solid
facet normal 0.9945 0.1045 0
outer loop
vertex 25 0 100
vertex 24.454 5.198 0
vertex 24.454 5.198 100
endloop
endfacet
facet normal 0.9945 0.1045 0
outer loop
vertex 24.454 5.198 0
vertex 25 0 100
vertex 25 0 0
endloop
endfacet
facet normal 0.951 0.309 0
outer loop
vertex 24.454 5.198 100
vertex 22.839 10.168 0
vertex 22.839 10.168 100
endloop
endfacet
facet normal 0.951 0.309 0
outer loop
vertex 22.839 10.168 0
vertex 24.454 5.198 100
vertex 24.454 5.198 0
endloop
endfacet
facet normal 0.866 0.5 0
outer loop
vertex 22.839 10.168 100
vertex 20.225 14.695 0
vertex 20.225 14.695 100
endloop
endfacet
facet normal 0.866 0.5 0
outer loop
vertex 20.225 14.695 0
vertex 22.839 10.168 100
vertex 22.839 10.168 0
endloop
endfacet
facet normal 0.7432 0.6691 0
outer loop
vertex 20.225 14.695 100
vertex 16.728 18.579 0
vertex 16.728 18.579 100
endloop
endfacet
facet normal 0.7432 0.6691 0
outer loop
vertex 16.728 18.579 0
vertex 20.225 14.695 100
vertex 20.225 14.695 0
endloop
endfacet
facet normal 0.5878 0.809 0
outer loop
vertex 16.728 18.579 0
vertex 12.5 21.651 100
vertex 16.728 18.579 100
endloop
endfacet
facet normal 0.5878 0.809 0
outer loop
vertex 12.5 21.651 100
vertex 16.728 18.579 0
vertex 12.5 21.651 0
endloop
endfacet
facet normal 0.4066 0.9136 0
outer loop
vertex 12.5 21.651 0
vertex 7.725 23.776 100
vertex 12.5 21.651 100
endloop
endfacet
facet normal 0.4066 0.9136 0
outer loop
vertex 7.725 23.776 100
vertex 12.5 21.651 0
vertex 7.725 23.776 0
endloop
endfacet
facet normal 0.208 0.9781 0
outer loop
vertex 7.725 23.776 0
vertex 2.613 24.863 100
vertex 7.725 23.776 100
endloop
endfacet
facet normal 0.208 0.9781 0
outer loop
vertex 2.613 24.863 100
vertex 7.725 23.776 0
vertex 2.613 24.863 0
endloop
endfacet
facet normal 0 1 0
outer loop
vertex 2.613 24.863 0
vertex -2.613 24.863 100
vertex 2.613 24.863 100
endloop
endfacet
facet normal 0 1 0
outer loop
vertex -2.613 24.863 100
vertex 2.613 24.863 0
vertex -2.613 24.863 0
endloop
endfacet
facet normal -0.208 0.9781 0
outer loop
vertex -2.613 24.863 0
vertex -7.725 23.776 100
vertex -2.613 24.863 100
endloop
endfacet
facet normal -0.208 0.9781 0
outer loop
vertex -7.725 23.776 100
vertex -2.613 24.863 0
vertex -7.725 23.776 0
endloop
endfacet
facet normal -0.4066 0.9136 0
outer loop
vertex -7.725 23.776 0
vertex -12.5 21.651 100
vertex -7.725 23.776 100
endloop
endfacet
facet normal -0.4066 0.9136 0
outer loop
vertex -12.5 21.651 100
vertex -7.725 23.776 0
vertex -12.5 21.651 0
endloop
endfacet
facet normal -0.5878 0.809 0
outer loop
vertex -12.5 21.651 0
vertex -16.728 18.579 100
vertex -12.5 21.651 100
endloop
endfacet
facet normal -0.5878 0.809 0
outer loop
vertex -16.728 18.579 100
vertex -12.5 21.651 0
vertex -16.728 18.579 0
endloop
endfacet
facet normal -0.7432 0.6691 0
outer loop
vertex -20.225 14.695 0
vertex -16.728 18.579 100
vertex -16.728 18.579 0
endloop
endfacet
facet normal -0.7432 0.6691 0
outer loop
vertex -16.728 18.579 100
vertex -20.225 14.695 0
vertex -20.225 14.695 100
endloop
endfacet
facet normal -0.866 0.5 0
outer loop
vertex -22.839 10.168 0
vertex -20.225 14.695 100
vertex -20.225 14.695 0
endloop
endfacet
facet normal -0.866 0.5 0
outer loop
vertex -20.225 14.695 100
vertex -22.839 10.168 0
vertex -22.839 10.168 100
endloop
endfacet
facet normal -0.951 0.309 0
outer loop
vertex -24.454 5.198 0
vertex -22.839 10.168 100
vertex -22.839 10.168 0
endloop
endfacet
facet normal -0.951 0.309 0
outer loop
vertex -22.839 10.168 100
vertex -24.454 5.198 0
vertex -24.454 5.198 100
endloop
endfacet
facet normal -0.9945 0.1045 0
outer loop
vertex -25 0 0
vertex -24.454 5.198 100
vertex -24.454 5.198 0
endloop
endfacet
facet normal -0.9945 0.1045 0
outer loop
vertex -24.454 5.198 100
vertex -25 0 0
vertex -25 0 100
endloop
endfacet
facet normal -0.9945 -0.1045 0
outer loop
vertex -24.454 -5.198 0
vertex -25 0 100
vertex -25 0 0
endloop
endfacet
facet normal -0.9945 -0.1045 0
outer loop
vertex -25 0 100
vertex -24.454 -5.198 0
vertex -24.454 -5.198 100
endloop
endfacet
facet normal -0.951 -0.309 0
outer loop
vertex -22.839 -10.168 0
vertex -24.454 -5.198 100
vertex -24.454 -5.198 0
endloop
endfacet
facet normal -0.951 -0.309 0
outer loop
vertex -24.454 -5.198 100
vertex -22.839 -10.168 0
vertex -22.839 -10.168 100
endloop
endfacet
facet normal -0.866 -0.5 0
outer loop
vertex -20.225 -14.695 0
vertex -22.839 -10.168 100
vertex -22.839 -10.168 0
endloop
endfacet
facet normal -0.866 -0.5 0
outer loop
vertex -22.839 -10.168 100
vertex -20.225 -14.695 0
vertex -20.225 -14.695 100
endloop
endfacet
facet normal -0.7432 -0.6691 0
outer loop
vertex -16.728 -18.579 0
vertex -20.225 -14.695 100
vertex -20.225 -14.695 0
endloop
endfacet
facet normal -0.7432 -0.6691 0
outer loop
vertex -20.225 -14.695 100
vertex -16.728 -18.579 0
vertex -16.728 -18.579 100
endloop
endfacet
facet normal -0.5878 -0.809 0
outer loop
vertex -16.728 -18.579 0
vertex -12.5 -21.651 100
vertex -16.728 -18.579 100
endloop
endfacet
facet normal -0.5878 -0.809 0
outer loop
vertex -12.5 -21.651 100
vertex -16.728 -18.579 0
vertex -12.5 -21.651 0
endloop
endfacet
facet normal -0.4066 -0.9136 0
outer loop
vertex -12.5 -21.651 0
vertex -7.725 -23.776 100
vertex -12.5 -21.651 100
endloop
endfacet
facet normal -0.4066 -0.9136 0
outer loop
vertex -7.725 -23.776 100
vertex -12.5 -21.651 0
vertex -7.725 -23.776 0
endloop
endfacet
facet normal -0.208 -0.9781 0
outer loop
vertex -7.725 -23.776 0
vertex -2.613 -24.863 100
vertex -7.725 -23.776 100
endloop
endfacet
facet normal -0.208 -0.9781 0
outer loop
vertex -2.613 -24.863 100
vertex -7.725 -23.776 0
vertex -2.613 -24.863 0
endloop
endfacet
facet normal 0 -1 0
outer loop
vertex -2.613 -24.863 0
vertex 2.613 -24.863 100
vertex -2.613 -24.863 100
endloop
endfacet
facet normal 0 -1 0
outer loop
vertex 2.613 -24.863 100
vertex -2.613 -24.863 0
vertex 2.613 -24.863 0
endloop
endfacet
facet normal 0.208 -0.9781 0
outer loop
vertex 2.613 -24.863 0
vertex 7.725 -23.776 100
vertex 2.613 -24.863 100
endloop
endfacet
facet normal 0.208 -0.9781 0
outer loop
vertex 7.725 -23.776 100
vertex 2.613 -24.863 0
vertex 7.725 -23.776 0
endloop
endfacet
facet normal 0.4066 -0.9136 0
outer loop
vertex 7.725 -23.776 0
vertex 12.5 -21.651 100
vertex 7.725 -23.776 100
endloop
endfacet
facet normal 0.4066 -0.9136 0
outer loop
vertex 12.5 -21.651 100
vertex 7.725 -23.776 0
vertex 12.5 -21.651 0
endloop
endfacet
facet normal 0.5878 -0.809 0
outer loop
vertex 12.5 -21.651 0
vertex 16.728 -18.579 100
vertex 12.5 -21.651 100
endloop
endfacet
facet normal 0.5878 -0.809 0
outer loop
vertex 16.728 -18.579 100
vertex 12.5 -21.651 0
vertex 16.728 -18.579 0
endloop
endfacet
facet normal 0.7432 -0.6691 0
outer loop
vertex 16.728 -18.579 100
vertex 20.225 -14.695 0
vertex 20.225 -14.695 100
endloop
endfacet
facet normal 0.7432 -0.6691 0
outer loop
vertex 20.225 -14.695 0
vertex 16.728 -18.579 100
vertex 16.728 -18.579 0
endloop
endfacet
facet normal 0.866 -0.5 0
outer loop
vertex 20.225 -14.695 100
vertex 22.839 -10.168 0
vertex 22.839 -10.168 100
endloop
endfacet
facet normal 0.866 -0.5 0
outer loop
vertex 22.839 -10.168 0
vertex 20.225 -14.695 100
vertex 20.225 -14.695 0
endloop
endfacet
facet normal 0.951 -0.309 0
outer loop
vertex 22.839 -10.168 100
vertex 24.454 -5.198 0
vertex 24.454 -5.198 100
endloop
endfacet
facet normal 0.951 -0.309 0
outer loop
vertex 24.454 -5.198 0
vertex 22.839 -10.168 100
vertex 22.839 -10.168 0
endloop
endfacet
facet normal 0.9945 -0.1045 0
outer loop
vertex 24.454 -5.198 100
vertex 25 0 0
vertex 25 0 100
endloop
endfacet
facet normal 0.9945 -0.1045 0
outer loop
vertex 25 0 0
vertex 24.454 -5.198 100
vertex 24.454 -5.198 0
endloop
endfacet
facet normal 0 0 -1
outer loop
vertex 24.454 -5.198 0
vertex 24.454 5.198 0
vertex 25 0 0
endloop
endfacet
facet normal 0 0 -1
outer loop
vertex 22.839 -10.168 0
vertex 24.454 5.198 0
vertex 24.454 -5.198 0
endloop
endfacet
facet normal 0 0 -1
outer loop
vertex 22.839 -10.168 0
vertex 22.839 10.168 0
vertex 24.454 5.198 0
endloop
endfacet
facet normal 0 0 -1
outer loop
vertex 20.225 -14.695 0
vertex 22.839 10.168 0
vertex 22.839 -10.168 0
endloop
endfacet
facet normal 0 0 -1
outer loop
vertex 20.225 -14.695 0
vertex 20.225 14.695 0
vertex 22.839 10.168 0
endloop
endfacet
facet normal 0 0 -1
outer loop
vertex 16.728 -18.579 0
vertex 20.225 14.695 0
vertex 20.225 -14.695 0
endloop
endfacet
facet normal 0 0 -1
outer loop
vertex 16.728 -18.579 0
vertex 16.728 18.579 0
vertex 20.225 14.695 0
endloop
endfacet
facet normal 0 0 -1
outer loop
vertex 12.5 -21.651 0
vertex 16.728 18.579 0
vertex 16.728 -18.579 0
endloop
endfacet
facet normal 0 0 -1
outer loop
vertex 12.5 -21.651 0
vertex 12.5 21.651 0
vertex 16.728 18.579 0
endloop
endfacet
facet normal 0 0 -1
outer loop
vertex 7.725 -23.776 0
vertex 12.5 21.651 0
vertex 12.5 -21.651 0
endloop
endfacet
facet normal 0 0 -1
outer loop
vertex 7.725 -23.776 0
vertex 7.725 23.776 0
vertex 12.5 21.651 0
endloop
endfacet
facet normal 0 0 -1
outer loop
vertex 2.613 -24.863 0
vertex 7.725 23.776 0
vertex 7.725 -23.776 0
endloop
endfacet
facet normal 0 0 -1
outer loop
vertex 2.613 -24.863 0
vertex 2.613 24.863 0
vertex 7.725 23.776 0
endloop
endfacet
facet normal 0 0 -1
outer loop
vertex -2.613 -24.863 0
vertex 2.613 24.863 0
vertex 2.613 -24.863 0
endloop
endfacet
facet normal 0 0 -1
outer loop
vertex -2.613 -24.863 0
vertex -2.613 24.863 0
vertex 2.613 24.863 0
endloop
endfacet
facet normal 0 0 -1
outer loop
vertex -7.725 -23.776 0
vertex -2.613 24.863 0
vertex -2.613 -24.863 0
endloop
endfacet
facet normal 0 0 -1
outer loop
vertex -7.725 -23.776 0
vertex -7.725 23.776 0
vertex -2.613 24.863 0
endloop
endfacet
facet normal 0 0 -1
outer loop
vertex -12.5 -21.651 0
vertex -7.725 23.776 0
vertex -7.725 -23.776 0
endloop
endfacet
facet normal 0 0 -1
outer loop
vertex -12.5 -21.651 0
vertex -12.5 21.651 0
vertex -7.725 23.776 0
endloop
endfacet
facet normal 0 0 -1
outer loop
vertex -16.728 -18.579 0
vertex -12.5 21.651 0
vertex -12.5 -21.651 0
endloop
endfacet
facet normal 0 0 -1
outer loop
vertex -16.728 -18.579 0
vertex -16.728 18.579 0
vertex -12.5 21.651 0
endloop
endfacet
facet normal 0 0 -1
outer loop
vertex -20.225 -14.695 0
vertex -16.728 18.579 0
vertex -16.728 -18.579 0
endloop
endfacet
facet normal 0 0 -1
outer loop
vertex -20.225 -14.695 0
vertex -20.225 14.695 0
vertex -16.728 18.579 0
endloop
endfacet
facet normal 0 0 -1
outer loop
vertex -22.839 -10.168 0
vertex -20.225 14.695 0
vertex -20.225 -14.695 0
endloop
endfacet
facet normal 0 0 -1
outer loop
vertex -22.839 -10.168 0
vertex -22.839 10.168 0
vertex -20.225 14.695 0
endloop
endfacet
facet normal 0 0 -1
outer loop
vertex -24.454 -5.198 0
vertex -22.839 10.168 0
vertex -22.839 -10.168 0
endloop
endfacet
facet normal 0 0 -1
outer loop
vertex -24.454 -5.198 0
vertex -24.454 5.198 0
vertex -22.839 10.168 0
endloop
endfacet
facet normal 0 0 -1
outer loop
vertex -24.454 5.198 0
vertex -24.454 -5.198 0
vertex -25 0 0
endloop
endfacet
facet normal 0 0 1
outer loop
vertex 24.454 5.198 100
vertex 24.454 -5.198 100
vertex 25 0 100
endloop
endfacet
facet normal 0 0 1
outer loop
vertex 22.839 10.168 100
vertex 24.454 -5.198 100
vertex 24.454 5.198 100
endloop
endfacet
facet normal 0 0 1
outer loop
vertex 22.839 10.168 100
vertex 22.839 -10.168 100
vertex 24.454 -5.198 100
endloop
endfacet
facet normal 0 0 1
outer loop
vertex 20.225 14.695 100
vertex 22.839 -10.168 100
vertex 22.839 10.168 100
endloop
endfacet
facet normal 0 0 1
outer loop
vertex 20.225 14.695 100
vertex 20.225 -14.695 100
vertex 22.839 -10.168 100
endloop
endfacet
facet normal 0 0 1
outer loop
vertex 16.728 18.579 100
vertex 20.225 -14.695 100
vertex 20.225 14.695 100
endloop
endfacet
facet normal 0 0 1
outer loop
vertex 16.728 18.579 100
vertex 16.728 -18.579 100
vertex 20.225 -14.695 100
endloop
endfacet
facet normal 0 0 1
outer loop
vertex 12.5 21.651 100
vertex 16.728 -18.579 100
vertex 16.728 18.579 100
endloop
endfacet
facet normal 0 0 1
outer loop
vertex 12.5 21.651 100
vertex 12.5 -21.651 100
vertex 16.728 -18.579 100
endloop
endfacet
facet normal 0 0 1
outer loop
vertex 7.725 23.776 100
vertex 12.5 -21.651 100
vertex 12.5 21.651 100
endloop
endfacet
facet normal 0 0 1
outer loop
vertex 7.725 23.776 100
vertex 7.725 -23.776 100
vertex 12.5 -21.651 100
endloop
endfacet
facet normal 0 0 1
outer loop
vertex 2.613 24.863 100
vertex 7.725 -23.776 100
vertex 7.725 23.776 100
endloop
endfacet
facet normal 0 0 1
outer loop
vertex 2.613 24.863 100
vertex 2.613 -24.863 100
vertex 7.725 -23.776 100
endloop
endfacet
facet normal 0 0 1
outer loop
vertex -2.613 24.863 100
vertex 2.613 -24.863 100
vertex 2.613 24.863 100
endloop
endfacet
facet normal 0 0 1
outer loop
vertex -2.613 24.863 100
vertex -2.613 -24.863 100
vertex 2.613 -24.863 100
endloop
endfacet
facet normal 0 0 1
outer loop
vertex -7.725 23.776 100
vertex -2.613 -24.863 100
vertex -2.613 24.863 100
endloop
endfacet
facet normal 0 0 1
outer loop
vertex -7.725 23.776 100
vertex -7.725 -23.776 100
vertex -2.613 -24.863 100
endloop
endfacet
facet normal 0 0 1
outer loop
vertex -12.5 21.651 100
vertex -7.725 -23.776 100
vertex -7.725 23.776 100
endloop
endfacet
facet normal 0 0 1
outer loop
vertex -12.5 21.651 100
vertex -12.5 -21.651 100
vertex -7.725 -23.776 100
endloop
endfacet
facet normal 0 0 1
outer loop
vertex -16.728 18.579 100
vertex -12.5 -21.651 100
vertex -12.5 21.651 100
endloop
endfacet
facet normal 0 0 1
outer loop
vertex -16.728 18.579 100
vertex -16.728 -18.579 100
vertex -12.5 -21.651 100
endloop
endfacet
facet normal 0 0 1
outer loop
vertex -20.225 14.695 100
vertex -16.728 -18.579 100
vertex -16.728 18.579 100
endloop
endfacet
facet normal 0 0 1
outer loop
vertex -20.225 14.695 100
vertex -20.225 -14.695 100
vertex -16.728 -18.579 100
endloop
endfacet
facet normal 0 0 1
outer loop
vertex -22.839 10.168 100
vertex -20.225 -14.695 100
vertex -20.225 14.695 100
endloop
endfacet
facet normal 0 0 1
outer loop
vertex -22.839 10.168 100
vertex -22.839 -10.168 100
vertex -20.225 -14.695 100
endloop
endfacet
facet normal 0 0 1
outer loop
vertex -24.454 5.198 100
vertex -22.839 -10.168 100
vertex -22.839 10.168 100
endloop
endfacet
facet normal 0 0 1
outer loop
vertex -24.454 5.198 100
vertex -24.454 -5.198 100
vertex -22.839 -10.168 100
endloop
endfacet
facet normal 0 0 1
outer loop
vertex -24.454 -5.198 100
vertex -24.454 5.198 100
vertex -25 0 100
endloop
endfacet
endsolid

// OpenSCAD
// Generated by SolidPython 1.1.3 on 2024-12-13 22:44:48


cylinder(h = 100, r = 25.0000000000);
/***********************************************
*********      SolidPython code:      **********
************************************************
 
import cv2
import os
from solid import cube, cylinder, sphere, scad_render_to_file, union
from solid.utils import polyhedron

# Function to detect shape
def detect_shape(view, view_name):
    if view is None:
        raise ValueError(f"{view_name} image could not be loaded. Check the file path.")

    gray_image = cv2.cvtColor(view, cv2.COLOR_BGR2GRAY)
    _, thresh_image = cv2.threshold(gray_image, 220, 255, cv2.THRESH_BINARY)
    contours, _ = cv2.findContours(thresh_image, cv2.RETR_TREE, cv2.CHAIN_APPROX_SIMPLE)

    for i, contour in enumerate(contours):
        if i == 0:
            continue  # Skip the outermost contour

        epsilon = 0.01 * cv2.arcLength(contour, True)
        approx = cv2.approxPolyDP(contour, epsilon, True)

        if len(approx) == 3:
            return "Triangle"
        elif len(approx) == 4:
            (x, y, w, h) = cv2.boundingRect(approx)
            aspect_ratio = w / float(h)
            if 0.95 <= aspect_ratio <= 1.05:
                return "Square"
            else:
                return "Rectangle"
        elif len(approx) == 5:
            return "Pentagon"
        elif len(approx) == 6:
            return "Hexagon"
        else:
            return "Circle"

    return "Unknown"


def identify_3d_shape(front_view, top_view, side_view):
    front_shape = detect_shape(front_view, "Front")
    top_shape = detect_shape(top_view, "Top")
    side_shape = detect_shape(side_view, "Side")

    if front_shape == "Square" and top_shape == "Square" and side_shape == "Square":
        return "Cube"
    elif front_shape == "Rectangle" and top_shape == "Circle" and side_shape == "Rectangle":
        return "Cylinder"
    elif front_shape == "Triangle" and top_shape == "Circle" and side_shape == "Triangle":
        return "Cone"
    elif front_shape == "Triangle" and top_shape == "Square" and side_shape == "Triangle":
        return "Pyramid"
    else:
        return "Shape not recognized"


# Function to create a 3D model
def create_3d_model(shape, dimensions, output_file):
    width, depth, height = dimensions
    if shape == "Cube":
        model = cube([width, depth, height])
    elif shape == "Cylinder":
        radius = width / 2.0
        model = cylinder(r=radius, h=height)
    elif shape == "Cone":
        radius = width / 2.0
        model = polyhedron(
            points=[
                [0, 0, 0], [radius, 0, 0], [0, radius, 0],  # Base points
                [0, 0, height]  # Apex point
            ],
            faces=[
                [0, 1, 3], [1, 2, 3], [2, 0, 3],  # Sides
                [0, 1, 2]  # Base
            ]
        )
    elif shape == "Pyramid":
        model = polyhedron(
            points=[
                [0, 0, 0], [width, 0, 0], [width, depth, 0], [0, depth, 0],  # Base points
                [width / 2, depth / 2, height]  # Apex
            ],
            faces=[
                [0, 1, 4], [1, 2, 4], [2, 3, 4], [3, 0, 4],  # Sides
                [0, 1, 2, 3]  # Base
            ]
        )
    else:
        raise ValueError(f"Unsupported shape: {shape}")

    scad_render_to_file(model, output_file)
    print(f"3D model for {shape} saved as '{output_file}'.")


if __name__ == "__main__":
    # File paths for the views
    front_path = r"C:\Users\Akshay\Downloads\3D_Shape_Generator\3D_Shape_Generator\images\cylinderfrontview.png"
    top_path = r"C:\Users\Akshay\Downloads\3D_Shape_Generator\3D_Shape_Generator\images\cylindertopview.png"
    side_path = r"C:\Users\Akshay\Downloads\3D_Shape_Generator\3D_Shape_Generator\images\cylindersideview.png"

    # Load images
    front_view = cv2.imread(front_path)
    top_view = cv2.imread(top_path)
    side_view = cv2.imread(side_path)

    # Identify 3D shape
    shape = identify_3d_shape(front_view, top_view, side_view)
    print(f"Detected 3D shape: {shape}")

    # Example dimensions (replace with actual data if available)
    dimensions = (50, 50, 100)  # Width, Depth, Height

    # Create output folder
    output_folder = "output"
    os.makedirs(output_folder, exist_ok=True)

    # Generate and save the SCAD file
    if shape != "Shape not recognized":
        output_file = os.path.join(output_folder, f"{shape.lower()}_model.scad")
        create_3d_model(shape, dimensions, output_file)
    else:
        print("Unable to generate 3D model. Shape could not be recognized.")
 
 
************************************************/
